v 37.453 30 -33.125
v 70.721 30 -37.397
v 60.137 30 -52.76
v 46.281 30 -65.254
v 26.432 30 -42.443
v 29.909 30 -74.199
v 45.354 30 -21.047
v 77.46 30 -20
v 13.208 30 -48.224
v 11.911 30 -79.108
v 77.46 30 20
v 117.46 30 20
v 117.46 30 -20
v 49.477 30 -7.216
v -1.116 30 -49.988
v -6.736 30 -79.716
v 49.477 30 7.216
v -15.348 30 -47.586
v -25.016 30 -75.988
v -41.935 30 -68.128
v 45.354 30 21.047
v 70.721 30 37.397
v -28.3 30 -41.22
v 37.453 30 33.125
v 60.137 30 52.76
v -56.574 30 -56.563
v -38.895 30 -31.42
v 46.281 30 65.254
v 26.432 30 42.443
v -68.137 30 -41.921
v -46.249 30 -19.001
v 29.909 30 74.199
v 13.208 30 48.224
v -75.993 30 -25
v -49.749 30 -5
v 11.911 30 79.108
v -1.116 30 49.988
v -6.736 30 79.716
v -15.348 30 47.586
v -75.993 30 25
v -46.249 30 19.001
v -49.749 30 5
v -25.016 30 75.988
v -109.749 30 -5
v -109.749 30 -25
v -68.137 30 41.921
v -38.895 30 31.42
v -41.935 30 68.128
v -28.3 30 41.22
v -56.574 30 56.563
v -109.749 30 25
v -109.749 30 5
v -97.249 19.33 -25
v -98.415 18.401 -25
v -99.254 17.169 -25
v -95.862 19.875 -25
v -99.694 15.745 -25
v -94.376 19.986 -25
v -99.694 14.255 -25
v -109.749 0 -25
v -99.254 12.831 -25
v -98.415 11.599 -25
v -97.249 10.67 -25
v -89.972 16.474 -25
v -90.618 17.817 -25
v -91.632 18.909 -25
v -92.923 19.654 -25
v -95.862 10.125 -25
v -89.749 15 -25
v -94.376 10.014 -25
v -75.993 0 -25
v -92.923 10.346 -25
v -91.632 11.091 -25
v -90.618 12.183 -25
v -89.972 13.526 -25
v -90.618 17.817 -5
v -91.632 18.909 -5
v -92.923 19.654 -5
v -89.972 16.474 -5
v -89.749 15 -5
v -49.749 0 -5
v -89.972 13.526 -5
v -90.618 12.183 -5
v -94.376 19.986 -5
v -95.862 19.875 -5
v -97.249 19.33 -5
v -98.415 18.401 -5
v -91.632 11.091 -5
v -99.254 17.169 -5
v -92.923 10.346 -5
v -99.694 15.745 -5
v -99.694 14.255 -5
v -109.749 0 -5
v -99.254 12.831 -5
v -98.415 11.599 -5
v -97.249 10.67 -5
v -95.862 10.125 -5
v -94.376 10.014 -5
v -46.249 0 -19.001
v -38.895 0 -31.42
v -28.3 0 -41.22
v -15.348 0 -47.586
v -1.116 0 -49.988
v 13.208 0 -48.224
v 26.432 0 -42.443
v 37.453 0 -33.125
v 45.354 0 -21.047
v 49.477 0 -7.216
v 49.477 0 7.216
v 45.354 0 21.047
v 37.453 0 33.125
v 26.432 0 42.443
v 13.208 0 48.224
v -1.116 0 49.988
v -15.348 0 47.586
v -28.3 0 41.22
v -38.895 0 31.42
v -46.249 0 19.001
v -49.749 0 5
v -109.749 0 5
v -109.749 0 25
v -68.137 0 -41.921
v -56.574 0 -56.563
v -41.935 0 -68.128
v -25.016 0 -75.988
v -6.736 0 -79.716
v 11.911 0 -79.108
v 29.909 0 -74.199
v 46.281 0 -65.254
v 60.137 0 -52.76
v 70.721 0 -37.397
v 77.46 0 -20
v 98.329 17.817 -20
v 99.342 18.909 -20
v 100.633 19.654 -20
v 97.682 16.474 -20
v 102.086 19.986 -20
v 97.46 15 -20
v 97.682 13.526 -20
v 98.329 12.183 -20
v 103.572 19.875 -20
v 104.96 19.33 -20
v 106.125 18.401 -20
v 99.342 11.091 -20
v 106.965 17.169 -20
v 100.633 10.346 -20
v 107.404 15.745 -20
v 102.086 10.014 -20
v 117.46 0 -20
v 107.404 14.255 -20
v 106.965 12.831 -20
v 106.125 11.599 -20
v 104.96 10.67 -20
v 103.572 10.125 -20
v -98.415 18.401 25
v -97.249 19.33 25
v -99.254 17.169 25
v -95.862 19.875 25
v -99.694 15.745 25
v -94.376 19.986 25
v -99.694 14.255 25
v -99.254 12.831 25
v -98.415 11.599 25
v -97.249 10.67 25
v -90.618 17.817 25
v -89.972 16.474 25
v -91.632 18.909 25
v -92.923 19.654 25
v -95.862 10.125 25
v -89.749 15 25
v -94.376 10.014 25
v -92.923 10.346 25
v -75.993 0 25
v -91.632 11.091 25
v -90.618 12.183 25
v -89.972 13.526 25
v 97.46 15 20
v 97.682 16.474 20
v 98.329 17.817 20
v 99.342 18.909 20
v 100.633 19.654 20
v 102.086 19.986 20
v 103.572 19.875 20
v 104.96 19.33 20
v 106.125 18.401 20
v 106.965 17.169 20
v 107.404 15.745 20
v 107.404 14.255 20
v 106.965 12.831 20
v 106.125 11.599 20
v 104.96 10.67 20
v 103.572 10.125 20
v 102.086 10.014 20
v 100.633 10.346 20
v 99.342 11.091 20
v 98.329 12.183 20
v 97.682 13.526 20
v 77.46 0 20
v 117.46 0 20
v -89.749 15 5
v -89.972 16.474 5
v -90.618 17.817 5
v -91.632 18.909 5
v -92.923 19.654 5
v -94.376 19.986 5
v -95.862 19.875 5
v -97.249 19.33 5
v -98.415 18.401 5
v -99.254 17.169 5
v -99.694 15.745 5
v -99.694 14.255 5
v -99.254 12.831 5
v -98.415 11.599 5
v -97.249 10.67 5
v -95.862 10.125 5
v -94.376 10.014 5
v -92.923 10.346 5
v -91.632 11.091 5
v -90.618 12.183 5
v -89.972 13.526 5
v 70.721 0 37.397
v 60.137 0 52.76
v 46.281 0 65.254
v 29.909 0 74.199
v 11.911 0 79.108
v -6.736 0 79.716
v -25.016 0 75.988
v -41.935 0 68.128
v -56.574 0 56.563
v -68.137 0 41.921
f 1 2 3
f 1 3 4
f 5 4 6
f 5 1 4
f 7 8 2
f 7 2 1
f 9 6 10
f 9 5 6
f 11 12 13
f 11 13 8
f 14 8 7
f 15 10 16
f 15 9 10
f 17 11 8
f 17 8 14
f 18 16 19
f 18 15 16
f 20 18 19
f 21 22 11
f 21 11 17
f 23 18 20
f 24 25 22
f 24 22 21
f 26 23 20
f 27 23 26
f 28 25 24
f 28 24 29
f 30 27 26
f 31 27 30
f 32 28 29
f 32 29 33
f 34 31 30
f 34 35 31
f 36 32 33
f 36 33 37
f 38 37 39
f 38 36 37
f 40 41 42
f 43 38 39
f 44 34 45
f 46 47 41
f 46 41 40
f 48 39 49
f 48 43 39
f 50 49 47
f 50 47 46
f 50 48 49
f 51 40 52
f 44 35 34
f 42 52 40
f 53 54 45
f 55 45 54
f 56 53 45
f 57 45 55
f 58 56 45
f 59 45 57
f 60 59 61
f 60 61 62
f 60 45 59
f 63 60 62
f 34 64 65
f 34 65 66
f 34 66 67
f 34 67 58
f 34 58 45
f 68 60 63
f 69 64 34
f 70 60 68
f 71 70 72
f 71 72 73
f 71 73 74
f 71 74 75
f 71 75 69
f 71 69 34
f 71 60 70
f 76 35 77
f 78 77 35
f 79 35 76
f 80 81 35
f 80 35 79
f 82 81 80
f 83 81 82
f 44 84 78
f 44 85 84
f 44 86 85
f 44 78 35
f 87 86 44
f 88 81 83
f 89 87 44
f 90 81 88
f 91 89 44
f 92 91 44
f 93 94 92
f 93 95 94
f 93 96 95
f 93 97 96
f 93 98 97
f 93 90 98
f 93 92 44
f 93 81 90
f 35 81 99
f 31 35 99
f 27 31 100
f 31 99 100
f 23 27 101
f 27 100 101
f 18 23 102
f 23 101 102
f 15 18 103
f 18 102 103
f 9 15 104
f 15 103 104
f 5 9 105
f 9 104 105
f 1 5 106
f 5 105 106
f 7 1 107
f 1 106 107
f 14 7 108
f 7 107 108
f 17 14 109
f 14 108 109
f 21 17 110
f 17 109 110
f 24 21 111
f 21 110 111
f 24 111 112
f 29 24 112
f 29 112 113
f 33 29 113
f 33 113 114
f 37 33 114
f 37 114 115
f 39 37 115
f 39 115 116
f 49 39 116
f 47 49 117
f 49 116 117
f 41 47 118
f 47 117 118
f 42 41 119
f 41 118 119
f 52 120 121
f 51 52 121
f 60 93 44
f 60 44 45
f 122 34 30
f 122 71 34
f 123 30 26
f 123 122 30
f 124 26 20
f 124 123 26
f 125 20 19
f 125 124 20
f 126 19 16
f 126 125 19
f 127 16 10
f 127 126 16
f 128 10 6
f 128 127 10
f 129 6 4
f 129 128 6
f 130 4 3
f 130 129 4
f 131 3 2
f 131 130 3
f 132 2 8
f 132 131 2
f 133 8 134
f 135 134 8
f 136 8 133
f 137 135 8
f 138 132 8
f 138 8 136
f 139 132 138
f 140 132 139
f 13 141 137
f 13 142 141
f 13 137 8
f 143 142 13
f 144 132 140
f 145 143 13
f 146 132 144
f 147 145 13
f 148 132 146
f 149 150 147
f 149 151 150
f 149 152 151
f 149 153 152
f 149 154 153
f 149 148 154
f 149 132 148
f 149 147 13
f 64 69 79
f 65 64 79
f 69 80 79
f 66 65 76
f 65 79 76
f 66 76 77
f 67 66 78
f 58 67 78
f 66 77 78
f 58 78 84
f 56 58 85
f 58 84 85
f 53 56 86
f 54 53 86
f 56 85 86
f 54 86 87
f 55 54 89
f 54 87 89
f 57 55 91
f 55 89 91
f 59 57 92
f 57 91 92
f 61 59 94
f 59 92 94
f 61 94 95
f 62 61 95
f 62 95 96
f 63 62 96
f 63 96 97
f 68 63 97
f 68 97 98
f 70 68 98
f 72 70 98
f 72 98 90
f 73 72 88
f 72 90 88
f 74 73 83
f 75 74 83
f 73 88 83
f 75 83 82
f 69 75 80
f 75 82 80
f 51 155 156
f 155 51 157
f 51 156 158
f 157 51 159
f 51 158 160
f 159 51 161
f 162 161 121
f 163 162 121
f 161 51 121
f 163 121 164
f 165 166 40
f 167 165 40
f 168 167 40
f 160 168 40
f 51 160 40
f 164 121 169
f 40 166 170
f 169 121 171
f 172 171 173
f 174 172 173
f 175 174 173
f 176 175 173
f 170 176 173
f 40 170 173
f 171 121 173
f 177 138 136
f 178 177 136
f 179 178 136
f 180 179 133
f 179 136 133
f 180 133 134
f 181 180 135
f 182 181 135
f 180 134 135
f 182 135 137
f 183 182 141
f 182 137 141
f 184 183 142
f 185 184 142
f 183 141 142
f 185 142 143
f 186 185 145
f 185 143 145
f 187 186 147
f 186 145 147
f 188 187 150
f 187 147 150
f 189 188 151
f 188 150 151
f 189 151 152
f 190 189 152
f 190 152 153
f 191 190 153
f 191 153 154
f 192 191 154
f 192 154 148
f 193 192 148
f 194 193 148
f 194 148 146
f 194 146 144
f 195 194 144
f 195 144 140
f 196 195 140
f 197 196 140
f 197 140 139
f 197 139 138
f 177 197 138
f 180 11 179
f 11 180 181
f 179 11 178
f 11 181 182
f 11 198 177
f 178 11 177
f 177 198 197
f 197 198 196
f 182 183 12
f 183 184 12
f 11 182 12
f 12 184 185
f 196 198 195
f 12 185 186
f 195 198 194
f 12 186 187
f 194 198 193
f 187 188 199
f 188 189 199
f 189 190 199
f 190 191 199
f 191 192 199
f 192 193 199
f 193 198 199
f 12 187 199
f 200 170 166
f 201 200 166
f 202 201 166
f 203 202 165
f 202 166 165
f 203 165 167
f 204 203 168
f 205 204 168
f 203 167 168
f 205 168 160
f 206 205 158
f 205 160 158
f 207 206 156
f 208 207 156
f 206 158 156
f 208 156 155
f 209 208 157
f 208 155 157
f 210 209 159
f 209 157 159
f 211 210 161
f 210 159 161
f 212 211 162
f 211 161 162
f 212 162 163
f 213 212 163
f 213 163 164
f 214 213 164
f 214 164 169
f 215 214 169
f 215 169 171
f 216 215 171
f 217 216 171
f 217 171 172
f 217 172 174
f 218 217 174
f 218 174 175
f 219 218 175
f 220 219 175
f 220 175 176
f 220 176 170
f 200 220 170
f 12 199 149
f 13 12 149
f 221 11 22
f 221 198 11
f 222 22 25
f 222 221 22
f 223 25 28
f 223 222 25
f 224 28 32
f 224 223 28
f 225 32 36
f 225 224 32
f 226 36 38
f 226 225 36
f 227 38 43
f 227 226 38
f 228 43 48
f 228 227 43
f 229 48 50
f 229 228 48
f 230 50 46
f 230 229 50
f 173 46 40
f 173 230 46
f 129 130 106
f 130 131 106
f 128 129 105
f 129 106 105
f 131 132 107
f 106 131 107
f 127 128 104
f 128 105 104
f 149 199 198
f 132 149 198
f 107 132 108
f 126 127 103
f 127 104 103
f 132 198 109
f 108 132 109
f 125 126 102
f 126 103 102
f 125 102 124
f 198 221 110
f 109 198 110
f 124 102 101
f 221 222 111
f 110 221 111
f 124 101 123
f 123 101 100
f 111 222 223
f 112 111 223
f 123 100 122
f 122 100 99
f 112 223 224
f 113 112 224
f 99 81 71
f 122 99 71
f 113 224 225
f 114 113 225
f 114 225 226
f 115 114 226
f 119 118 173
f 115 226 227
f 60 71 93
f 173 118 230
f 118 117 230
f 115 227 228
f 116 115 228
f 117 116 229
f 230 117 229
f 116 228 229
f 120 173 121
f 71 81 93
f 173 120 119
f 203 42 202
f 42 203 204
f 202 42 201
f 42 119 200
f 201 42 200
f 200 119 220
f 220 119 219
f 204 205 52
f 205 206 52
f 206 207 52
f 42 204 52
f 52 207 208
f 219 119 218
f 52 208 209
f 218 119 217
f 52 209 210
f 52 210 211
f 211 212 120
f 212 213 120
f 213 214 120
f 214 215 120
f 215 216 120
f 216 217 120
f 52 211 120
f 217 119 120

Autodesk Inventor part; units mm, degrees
ref_plane "YZ Plane" through (0, 0, 0) normal (1, 0, 0) x (0, 1, 0)
ref_plane "XZ Plane" through (0, 0, 0) normal (0, 1, 0) x (-1, 0, 0)
ref_plane "XY Plane" through (0, 0, 0) normal (0, 0, 1) x (1, 0, 0)
sketch "Block1" plane through (0, 0, 0) normal (0, 0, 1) x (1, 0, 0)
  arc A0 (-75.921, -24.9) -> (77.3822, -19.9) centre (0, 0) ccw
  line L0 (-75.921, -24.9) -> (-109.6494, -24.9)
  line L1 (-109.6494, -24.9) -> (-109.6494, -5.1)
  line L2 (-109.6494, -5.1) -> (-49.8397, -5.1)
  arc A1 (-49.8397, -5.1) -> (-49.8397, 5.1) centre (0, 0) ccw
  line L3 (-49.8397, 5.1) -> (-109.6494, 5.1)
  line L4 (-109.6494, 5.1) -> (-109.6494, 24.9)
  line L5 (-109.6494, 24.9) -> (-75.921, 24.9)
  arc A2 (77.3822, 19.9) -> (-75.921, 24.9) centre (0, 0) ccw
  line L6 (77.3822, 19.9) -> (117.3597, 19.9)
  line L7 (117.3597, 19.9) -> (117.3597, -19.9)
  line L8 (117.3597, -19.9) -> (77.3822, -19.9)
  point P0 (-23.1258, 0)
sketch "Sketch1" plane through (0, 0, 0) normal (0, 1, 0) x (-1, 0, 0)
  arc A0 (49.7494, 5) -> (49.7494, -5) centre (0, 0) ccw
  line L0 (49.7494, 5) -> (109.7494, 5)
  line L1 (109.7494, 5) -> (109.7494, 25)
  line L2 (155.1912, 0) -> (-162.9015, 0) projected
  line L3 (0, -115.4406) -> (0, 115.4406) projected
  line L4 (109.7494, 25) -> (75.9934, 25)
  line L5 (49.7494, -5) -> (109.7494, -5)
  line L6 (109.7494, -5) -> (109.7494, -25)
  line L7 (109.7494, -25) -> (75.9934, -25)
  line L8 (-77.4597, 20) -> (-117.4597, 20)
  line L9 (-117.4597, 20) -> (-117.4597, 0)
  line L10 (-77.4597, -20) -> (-117.4597, -20)
  line L11 (-117.4597, -20) -> (-117.4597, 0)
  arc A1 (75.9934, 25) -> (-77.4597, 20) centre (0, 0) ccw
  arc A2 (-77.4597, -20) -> (75.9934, -25) centre (0, 0) ccw
  point P0 (43.3013, 25)
  point P1 (43.3013, -25)
  dimension "d0" = 100
  dimension "d4" = 5
  dimension "d5" = 20
  dimension "d13" = 20
  dimension "d14" = 40
  dimension "d20" = 60
extrude "Extrusion1" add sketch "Sketch1" along normal blind 30 contours A0 L3 A1 L4 L1 L0 | A0 L2 L9 L8 A1 L3 | A0 L3 A2 L10 L11 L2 | A0 L5 L6 L7 A2 L3
sketch "Sketch3" plane through (-109.7494, 0, 25) normal (0, 0, 1) x (1, 0, 0)
  circle A0 centre (15, 15) radius 5
  line L0 (0, 0) -> (33.756, 0) projected
  line L1 (0, 0) -> (0, 30) projected
  point P0 (109.7494, 0)
  dimension "d8" = 10
  dimension "d9" = 15
  dimension "d10" = 15
extrude "Extrusion2" cut sketch "Sketch3" against normal through all
sketch "Sketch4" plane through (117.4597, 0, -20) normal (0, 0, -1) x (-1, 0, 0)
  circle A0 centre (15, 15) radius 5
  line L0 (0, 0) -> (0, 30) projected
  line L1 (0, 30) -> (40, 30) projected
  point P0 (117.4597, 0)
  dimension "d15" = 10
  dimension "d16" = 15
  dimension "d17" = 15
extrude "Extrusion3" cut sketch "Sketch4" against normal through all
sketch "Sketch5" plane through (0, 0, 0) normal (0, -1, 0) x (1, 0, 0)
  line L0 (117.4597, 20) -> (117.4597, -20) projected
  line L1 (77.4597, 20) -> (117.4597, 20) projected
  arc A0 (77.4597, 20) -> (-75.9934, 25) centre (0, 0) ccw projected
  line L2 (-109.7494, 25) -> (-75.9934, 25) projected
  line L3 (-109.7494, 5) -> (-109.7494, 25) projected
  line L4 (-49.7494, 5) -> (-109.7494, 5) projected
  arc A1 (-49.7494, -5) -> (-49.7494, 5) centre (0, 0) ccw projected
  line L5 (-109.7494, -5) -> (-49.7494, -5) projected
  line L6 (-109.7494, -25) -> (-109.7494, -5) projected
  line L7 (-75.9934, -25) -> (-109.7494, -25) projected
  arc A2 (-75.9934, -25) -> (77.4597, -20) centre (0, 0) ccw projected
  line L8 (117.4597, -20) -> (77.4597, -20) projected
sketch "DXF" plane through (0, 0, 0) normal (0, 1, 0) x (-1, 0, 0)
  point P0 (0, 0)
equation "\"d0\" = Grip"
equation "\"Grip\" = 100"
properties part number "mallet_holder"
